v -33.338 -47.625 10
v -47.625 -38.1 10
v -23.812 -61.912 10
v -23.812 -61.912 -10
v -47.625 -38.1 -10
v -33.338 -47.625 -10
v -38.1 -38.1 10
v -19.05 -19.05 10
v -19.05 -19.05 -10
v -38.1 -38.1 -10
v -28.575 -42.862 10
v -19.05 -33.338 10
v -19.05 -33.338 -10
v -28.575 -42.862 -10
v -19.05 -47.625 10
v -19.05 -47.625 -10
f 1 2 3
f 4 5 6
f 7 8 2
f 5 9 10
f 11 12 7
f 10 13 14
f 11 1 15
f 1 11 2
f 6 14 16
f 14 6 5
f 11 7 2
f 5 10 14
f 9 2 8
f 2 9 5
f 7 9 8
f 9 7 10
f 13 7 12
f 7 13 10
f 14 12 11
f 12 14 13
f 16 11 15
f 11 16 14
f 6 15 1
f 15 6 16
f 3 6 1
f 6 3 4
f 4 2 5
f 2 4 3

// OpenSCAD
polyhedron(
    points=[
    [-47.625, -38.1, 10],
    [-19.05, -19.05, 10],
    [-38.1, -38.1, 10],
    [-19.05, -33.3375, 10],
    [-28.575, -42.8625, 10],
    [-19.05, -47.625, 10],
    [-33.3375, -47.625, 10],
    [-23.8125, -61.9125, 10],
    [-47.625, -38.1, -10],
    [-19.05, -19.05, -10],
    [-38.1, -38.1, -10],
    [-19.05, -33.3375, -10],
    [-28.575, -42.8625, -10],
    [-19.05, -47.625, -10],
    [-33.3375, -47.625, -10],
    [-23.8125, -61.9125, -10],
    ],
    faces=[
        [7,0,6],
        [14,8,15],
        [0,1,2],
        [10,9,8],
        [2,3,4],
        [12,11,10],
        [6,0,4,5],
        [13,12,8,14],
        [0,2,4],
        [12,10,8],
        [0,8,9,1],
        [1,9,10,2],
        [2,10,11,3],
        [3,11,12,4],
        [4,12,13,5],
        [5,13,14,6],
        [6,14,15,7],
        [7,15,8,0],
    ]
);
